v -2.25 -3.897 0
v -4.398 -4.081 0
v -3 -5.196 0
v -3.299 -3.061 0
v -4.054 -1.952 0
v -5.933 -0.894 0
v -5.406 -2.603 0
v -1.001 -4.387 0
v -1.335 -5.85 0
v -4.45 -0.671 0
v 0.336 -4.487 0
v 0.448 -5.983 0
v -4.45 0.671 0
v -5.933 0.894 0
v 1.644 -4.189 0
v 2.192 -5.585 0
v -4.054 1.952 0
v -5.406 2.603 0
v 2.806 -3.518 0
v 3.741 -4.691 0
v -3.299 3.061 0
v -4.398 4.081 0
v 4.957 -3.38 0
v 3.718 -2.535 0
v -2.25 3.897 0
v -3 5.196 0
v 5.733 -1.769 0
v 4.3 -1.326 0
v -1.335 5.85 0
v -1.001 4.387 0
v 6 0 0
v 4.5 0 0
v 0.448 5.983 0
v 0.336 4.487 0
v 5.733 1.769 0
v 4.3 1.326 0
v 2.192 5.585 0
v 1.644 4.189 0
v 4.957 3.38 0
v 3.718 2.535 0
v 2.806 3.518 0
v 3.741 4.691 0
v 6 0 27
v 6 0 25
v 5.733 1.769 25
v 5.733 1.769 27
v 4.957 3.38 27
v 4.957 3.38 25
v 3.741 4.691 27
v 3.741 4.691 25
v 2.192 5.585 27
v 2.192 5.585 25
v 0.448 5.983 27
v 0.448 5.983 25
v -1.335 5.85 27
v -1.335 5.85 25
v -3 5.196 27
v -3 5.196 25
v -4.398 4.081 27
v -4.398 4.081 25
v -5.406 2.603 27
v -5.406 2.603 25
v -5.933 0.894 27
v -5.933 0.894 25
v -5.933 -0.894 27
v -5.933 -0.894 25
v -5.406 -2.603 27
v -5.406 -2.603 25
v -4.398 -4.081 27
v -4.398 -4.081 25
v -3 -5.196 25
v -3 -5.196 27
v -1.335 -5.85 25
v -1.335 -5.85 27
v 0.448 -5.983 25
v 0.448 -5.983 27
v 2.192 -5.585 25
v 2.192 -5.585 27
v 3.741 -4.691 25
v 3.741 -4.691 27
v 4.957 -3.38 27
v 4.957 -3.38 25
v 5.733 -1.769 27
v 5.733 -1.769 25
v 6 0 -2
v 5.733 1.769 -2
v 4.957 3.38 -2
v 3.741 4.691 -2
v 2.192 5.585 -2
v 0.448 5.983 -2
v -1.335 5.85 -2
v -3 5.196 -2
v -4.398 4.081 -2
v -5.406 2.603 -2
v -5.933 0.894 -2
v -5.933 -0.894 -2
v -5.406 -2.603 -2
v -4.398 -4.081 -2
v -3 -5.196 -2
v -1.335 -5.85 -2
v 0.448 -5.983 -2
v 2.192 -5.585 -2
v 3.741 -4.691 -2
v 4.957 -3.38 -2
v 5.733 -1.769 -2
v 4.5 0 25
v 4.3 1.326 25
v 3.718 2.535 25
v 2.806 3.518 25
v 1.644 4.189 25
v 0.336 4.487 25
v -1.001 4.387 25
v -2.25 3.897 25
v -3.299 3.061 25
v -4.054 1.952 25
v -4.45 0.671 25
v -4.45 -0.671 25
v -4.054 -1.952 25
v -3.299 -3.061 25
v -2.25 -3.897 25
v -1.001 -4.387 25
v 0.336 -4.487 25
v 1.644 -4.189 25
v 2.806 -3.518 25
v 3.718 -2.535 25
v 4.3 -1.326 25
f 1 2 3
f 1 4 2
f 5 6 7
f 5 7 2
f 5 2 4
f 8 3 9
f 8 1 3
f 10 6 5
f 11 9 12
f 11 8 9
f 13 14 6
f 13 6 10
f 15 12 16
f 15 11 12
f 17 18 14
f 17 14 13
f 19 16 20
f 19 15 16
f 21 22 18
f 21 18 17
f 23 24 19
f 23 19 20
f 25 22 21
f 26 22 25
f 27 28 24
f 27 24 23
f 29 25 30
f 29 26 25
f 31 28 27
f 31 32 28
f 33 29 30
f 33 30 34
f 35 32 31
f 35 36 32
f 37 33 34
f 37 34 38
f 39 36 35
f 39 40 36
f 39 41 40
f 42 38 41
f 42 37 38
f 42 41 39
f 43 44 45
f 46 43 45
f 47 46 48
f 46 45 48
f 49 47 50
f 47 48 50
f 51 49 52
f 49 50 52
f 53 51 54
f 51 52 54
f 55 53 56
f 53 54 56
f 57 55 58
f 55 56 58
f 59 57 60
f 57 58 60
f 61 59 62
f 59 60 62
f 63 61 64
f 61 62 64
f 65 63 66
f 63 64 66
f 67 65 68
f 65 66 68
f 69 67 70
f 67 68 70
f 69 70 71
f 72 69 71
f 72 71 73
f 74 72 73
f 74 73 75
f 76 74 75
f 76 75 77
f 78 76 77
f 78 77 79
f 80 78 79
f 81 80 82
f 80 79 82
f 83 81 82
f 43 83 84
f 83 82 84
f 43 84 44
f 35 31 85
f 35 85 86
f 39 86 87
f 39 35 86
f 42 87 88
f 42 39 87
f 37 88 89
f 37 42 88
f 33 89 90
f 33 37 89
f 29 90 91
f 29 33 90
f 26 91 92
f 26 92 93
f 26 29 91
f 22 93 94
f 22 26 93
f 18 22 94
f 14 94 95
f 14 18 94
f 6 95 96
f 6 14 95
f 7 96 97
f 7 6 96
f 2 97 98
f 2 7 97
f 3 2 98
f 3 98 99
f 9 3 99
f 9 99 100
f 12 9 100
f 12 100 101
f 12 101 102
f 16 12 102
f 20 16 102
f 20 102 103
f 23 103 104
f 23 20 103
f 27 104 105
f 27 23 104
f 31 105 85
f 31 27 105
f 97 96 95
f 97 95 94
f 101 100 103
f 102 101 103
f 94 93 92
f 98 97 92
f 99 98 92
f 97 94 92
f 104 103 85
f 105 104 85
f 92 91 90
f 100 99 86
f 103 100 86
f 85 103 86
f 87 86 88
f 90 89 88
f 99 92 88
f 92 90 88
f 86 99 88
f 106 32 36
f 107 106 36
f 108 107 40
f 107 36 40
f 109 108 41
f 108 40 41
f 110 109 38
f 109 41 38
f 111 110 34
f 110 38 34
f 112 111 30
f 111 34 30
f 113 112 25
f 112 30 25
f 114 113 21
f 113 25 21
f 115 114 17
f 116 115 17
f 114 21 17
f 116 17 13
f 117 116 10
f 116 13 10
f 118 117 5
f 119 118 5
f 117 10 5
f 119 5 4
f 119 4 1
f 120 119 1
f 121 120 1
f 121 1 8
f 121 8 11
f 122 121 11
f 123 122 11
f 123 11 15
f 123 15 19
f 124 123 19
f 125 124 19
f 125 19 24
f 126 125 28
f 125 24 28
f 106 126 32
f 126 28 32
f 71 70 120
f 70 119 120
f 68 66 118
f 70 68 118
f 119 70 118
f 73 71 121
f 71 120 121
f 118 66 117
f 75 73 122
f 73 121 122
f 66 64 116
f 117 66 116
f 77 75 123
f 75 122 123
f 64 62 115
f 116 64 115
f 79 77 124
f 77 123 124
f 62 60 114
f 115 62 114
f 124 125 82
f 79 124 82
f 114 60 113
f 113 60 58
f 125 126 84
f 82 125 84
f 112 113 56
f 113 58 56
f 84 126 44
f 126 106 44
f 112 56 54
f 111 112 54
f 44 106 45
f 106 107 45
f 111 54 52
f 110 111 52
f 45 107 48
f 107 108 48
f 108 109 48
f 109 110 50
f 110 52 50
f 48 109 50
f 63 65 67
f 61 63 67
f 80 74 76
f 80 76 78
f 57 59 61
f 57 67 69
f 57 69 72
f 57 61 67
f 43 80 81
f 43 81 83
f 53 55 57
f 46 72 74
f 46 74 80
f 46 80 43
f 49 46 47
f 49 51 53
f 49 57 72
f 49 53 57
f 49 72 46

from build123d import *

# Parameters (mm, degrees)
SKETCH1_R           = 4.5
BOSS_EXTRUDE1_DEPTH = 25
SKETCH2_R           = 6
BOSS_EXTRUDE2_DEPTH = 2
SKETCH3_R           = 6
BOSS_EXTRUDE3_DEPTH = 2


with BuildPart() as part:
    # Sketch1 → Boss-Extrude1 (new body)
    with BuildSketch(Plane.XY):
        Circle(SKETCH1_R)
    extrude(amount=BOSS_EXTRUDE1_DEPTH)

    # Sketch2 → Boss-Extrude2 (add)
    with BuildSketch(Plane.XY):
        Circle(SKETCH2_R)
    extrude(amount=-BOSS_EXTRUDE2_DEPTH)

    # Sketch3 → Boss-Extrude3 (add)
    with BuildSketch(Plane.XY.offset(25)):
        Circle(SKETCH3_R)
    extrude(amount=BOSS_EXTRUDE3_DEPTH)


solid = part.part
